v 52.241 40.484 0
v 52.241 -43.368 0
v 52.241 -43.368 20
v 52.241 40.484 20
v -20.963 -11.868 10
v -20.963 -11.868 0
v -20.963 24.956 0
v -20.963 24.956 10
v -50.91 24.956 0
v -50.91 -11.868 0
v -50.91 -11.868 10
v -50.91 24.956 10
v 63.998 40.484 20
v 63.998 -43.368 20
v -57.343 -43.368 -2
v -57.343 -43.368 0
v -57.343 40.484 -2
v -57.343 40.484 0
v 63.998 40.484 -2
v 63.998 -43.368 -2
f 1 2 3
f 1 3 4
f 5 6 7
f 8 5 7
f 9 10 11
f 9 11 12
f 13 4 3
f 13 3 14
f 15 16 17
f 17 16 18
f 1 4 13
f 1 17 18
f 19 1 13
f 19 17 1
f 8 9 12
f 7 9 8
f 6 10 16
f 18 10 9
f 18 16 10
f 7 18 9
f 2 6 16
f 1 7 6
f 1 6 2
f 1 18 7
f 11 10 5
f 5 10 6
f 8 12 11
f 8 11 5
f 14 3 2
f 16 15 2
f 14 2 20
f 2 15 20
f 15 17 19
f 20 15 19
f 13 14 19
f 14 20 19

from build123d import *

# Parameters (mm, degrees)
F0_W     = 11.7570459843
F0_H     = 83.8521160185
F0_W_2   = 109.5845103264
F0_W_3   = 29.9471821636
F0_H_2   = 36.8239460513
F1_DEPTH = 2
F2_DEPTH = 10
F3_DEPTH = 20


with BuildPart() as f1:
    # F0 (on Top) → F1 (new body)
    with BuildSketch(Plane.XY):
        with Locations((58.1197217107, -1.4419015497)):
            Rectangle(F0_W, F0_H)
        with Locations((-2.5510564446, -1.4419015497)):
            Rectangle(F0_W_2, F0_H)
        with Locations((-35.9366210178, 6.5440149046)):
            Rectangle(F0_W_3, F0_H_2, mode=Mode.SUBTRACT)
        with Locations((-35.9366210178, 6.5440149046)):
            Rectangle(F0_W_3, F0_H_2)
    extrude(amount=-F1_DEPTH)

    # F0 (on Top) → F2 (join)
    with BuildSketch(Plane.XY):
        with Locations((-35.9366210178, 6.5440149046)):
            Rectangle(F0_W_3, F0_H_2)
    extrude(amount=F2_DEPTH)

    # F0 (on Top) → F3 (join)
    with BuildSketch(Plane.XY):
        with Locations((58.1197217107, -1.4419015497)):
            Rectangle(F0_W, F0_H)
    extrude(amount=F3_DEPTH)


solid = f1.part
